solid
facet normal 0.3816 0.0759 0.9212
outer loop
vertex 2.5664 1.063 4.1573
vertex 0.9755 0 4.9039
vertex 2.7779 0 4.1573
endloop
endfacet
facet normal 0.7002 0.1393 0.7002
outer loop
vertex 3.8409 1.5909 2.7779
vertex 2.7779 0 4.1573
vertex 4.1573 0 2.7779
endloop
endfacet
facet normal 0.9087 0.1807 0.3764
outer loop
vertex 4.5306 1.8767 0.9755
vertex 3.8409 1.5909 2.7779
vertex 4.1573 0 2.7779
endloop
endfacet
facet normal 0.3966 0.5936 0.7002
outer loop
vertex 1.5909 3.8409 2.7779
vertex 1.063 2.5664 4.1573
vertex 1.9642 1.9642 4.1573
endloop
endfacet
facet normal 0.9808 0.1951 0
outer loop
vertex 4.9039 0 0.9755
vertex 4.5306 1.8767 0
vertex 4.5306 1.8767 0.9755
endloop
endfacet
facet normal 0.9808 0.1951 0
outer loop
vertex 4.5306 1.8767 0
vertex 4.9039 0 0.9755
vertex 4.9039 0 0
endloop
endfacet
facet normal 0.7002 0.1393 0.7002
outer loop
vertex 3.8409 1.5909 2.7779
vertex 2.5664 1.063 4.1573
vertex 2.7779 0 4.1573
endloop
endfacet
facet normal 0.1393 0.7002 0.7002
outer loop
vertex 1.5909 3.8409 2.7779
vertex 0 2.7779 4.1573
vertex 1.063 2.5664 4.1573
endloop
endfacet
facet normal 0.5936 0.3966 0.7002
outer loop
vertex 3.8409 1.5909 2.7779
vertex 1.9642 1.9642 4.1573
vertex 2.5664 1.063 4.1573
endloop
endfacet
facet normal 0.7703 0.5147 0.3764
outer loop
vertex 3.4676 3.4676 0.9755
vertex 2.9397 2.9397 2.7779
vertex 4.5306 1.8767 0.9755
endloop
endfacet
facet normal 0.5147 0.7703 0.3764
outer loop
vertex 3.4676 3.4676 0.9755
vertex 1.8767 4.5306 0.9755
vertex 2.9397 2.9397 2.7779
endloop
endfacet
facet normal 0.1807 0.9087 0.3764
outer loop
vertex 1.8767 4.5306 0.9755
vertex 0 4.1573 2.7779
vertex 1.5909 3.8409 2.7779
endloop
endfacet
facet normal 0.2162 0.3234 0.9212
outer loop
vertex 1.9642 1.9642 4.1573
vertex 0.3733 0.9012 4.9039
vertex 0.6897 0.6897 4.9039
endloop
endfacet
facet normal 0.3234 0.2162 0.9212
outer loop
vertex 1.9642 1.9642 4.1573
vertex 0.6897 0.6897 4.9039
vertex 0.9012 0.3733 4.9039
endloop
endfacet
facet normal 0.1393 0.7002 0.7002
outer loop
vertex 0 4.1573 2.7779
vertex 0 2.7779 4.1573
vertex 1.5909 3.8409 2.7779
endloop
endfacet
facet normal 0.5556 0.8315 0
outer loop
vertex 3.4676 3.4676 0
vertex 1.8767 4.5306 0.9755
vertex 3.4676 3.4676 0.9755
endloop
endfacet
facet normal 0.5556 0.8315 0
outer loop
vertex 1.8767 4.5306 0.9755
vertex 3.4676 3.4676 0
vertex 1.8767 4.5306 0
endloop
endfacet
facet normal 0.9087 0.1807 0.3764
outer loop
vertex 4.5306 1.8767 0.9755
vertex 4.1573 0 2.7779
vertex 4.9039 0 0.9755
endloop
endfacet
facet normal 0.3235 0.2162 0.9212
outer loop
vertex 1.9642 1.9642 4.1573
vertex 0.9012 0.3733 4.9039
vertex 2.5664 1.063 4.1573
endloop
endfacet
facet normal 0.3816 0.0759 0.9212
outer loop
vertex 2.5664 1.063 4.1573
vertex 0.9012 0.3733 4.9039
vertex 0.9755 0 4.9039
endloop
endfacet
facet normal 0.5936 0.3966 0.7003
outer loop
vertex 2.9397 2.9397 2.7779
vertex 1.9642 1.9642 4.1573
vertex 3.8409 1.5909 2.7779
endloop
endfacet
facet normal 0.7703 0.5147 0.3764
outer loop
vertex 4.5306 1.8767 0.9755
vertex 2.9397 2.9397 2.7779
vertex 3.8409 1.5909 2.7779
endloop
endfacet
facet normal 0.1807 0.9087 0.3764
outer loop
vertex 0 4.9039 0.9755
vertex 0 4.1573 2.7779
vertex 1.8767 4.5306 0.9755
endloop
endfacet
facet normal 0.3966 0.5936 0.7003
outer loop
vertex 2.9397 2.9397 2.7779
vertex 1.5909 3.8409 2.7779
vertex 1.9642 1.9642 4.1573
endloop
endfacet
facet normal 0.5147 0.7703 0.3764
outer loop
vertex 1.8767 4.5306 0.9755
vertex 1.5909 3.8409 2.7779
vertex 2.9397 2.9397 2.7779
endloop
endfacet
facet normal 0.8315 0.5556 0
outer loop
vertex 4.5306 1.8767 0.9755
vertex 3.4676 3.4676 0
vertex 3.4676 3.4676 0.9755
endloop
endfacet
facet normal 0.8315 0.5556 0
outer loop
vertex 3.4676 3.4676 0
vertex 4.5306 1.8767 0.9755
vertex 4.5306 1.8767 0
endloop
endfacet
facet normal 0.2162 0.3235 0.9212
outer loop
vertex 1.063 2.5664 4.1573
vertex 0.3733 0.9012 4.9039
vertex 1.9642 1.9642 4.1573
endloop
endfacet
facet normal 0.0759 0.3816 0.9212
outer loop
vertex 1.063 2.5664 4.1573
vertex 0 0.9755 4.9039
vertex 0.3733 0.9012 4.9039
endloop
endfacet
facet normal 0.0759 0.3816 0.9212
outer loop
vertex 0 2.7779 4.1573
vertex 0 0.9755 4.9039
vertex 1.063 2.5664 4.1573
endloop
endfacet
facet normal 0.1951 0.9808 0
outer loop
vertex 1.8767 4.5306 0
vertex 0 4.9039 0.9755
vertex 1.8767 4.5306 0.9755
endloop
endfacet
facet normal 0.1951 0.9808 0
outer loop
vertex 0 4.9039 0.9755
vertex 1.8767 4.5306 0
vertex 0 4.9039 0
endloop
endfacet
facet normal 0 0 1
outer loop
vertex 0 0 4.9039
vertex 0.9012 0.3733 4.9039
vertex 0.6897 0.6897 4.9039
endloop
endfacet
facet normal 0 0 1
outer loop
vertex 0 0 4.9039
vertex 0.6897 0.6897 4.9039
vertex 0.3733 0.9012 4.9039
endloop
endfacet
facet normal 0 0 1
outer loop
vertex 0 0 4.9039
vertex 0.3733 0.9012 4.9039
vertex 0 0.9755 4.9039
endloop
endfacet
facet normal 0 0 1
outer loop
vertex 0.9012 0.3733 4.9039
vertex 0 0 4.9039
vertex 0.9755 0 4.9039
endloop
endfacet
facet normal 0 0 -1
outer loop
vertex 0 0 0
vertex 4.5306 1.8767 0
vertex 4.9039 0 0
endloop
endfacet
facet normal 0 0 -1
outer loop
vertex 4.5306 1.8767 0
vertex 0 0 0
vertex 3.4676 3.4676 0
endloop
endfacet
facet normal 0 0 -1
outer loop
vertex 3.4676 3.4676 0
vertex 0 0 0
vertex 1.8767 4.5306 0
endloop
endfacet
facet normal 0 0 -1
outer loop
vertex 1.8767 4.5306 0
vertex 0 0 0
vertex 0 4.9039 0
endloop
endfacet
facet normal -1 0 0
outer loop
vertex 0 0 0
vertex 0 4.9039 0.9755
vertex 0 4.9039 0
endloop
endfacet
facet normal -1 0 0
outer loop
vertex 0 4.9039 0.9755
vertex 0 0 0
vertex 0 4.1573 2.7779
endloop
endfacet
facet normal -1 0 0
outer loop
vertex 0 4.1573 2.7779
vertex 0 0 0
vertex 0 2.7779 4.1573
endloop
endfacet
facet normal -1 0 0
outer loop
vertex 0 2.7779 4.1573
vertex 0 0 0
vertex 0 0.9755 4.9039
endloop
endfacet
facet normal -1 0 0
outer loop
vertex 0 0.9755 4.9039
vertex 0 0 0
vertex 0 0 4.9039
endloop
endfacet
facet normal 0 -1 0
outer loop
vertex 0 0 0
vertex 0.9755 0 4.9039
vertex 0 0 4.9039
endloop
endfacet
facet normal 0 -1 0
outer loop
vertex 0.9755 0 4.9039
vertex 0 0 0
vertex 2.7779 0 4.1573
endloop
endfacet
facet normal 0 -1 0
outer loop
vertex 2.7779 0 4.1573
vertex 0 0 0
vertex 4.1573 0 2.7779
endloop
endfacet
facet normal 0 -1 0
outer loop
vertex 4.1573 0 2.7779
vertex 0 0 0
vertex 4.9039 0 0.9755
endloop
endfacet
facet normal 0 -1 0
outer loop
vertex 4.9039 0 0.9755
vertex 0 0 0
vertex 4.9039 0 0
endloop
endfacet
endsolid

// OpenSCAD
//Author: 
//Date: 
//Description: Lesson 2-4 Combing shapes with intersections

//Render this code!
intersection() {
sphere(5);
cube([10, 10, 10]);
}

//1. Take the intersection of a sphere and a cube so that a quarter of the sphere reamin in octant 2

//2. Using intersection make a quarter of a cirlce (cylinder) in the first octant

//3. Using intersection make a half of a cirlce (cylinder) in the first and second octants

//4. Using intersection make two quarters of a cirlce (cylinder) in adjacent octants (i.e. 1 and 3)
